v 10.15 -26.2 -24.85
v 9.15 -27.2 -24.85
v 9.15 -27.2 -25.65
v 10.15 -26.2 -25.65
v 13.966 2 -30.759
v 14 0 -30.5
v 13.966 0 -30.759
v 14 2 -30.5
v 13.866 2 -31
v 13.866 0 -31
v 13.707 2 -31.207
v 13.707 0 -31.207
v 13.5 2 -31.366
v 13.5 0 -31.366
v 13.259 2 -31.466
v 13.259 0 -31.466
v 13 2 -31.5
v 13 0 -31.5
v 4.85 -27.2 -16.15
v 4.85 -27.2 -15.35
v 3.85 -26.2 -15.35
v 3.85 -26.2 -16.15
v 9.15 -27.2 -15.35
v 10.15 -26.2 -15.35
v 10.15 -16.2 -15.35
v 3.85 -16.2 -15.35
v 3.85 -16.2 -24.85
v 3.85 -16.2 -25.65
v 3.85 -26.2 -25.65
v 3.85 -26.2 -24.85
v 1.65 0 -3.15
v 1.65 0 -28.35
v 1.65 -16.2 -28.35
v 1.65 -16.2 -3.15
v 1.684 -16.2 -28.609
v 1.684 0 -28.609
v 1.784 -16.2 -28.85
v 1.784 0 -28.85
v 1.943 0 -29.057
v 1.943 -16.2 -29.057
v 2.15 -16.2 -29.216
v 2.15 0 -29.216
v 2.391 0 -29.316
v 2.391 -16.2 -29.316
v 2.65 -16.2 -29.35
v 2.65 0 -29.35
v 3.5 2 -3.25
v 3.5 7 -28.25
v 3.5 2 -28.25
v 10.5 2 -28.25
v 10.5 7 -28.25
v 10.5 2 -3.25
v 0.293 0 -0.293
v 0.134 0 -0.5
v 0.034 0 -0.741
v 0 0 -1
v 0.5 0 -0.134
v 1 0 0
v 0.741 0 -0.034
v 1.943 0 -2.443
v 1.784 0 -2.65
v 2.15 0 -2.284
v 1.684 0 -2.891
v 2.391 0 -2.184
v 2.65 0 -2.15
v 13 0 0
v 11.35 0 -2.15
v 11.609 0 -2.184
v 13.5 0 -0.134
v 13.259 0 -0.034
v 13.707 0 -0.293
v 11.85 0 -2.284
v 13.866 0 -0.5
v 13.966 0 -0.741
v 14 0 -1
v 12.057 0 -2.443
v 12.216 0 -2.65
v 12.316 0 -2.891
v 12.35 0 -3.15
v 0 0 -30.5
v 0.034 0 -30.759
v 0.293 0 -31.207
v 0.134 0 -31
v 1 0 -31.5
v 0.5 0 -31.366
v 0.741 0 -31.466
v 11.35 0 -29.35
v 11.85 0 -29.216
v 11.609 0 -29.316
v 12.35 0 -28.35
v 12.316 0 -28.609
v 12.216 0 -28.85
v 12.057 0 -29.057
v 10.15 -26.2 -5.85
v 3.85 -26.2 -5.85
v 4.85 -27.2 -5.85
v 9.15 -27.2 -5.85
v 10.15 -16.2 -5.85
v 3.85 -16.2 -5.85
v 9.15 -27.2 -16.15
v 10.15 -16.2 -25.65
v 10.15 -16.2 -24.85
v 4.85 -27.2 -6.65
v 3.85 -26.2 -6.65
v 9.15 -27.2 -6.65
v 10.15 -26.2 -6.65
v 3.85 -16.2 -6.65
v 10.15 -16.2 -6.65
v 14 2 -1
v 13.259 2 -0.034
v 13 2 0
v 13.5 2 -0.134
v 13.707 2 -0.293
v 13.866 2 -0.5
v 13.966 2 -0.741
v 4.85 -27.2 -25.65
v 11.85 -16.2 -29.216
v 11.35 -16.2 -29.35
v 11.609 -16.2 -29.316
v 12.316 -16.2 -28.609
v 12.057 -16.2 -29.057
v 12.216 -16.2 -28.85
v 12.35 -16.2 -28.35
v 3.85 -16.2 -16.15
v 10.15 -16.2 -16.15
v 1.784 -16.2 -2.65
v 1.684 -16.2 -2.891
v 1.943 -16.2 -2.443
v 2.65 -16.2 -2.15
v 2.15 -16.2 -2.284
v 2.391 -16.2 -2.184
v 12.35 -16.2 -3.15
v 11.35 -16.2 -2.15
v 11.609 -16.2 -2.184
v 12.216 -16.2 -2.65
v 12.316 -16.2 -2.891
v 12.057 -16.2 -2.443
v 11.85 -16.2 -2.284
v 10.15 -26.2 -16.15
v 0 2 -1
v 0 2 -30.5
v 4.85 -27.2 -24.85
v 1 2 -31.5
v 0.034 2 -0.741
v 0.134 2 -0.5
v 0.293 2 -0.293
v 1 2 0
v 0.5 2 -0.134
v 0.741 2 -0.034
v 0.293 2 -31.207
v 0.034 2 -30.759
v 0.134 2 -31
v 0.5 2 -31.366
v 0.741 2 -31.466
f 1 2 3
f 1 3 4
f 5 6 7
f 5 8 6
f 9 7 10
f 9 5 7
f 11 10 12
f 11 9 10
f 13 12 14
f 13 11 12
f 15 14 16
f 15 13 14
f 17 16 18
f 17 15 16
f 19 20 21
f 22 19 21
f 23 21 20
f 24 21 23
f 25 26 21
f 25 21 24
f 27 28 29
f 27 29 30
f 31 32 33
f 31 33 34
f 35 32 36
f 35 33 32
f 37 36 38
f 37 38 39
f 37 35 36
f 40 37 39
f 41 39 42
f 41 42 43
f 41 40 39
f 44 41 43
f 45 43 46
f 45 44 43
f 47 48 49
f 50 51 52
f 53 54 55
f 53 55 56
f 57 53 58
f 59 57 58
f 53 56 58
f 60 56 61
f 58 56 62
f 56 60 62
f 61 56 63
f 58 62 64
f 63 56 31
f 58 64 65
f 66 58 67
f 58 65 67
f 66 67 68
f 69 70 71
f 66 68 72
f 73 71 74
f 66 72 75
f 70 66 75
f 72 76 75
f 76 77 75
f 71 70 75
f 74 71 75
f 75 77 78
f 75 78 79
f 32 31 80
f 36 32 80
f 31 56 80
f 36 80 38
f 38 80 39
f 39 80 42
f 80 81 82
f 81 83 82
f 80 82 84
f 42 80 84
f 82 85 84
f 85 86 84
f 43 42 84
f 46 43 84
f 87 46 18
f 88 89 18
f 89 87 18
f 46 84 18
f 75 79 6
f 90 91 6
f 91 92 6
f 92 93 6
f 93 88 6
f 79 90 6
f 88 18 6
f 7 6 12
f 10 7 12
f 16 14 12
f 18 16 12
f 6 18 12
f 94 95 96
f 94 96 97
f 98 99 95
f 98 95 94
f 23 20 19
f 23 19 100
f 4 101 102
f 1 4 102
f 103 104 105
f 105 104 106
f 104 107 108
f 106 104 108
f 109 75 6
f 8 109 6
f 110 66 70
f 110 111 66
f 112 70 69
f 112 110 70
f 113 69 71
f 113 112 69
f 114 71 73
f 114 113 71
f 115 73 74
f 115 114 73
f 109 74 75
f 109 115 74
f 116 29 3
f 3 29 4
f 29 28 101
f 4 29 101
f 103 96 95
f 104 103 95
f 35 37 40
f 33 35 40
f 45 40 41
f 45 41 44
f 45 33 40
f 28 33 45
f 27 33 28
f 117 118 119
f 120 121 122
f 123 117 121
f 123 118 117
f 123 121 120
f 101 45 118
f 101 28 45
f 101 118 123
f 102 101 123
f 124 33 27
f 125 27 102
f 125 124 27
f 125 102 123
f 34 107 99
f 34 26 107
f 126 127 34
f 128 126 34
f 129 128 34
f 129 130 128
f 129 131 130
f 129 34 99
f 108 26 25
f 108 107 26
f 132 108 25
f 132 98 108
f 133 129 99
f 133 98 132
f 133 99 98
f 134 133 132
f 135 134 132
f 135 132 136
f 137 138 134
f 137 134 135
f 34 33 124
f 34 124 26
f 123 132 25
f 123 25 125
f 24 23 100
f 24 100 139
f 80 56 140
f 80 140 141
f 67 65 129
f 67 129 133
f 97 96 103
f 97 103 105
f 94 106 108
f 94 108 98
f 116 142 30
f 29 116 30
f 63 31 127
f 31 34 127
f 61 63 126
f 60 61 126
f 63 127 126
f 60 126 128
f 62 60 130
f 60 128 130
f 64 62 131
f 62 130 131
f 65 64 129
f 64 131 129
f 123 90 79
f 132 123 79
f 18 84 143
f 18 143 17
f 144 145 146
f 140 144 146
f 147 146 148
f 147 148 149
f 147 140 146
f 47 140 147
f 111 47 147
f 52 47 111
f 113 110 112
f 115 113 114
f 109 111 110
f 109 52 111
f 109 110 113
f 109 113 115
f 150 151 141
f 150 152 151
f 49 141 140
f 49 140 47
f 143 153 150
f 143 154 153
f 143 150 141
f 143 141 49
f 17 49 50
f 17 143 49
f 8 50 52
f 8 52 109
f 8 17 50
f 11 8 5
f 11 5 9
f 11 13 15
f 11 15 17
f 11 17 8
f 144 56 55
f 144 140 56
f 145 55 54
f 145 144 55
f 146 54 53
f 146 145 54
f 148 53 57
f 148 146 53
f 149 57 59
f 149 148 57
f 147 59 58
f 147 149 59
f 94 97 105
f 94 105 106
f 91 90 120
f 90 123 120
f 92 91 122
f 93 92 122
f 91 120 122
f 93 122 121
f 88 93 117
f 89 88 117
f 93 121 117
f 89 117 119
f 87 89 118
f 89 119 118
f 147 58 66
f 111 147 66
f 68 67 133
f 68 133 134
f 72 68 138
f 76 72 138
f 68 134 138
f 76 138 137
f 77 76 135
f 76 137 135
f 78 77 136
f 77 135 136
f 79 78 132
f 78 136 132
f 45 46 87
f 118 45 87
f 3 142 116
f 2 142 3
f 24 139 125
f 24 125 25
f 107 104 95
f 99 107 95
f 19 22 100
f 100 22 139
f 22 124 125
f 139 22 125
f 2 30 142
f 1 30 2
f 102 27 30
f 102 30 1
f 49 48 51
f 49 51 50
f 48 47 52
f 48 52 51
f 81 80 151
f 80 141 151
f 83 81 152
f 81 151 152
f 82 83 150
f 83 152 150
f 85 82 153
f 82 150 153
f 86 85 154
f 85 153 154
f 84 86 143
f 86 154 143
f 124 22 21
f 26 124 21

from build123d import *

# Parameters (mm, degrees)
SKIZZE1_W                            = 14
SKIZZE1_H                            = 31.5
AUFSATZ_LINEAR_AUSTRAGEN1_DEPTH      = 2
VERRUNDUNG1_R                        = 1
SKIZZE2_W                            = 10.7
SKIZZE2_H                            = 27.2
AUFSATZ_LINEAR_AUSTRAGEN2_DEPTH      = 16.2
VERRUNDUNG2_R                        = 1
SKIZZE3_W                            = 6.3
SKIZZE3_H                            = 0.8
AUFSATZ_LINEAR_AUSTRAGEN3_DEPTH      = 11
LINEARES_MUSTER1_COUNT               = 2
LINEARES_MUSTER1_PITCH               = 9.5
LINEARES_MUSTER1_COL_COUNT           = 2
LINEARES_MUSTER1_COL_PITCH           = 9.5
SCHNITT_LINEAR_AUSTRAGEN1_DEPTH      = 40.921955112
AUFSATZ_LINEAR_AUSTRAGEN4_DEPTH      = 3.5
AUFSATZ_LINEAR_AUSTRAGEN4_DEPTH_BACK = 3.5


with BuildPart() as part:
    # Skizze1 → Aufsatz-Linear austragen1 (new body)
    with BuildSketch(Plane(origin=(0, 0, 0), x_dir=(1, 0, 0), z_dir=(0, 1, 0))):
        with Locations((7, 15.75)):
            Rectangle(SKIZZE1_W, SKIZZE1_H)
    extrude(amount=AUFSATZ_LINEAR_AUSTRAGEN1_DEPTH)

    # Verrundung1
    verrundung1_edges = [part.edges().sort_by_distance(p)[0] for p in [
        (0, 1, -31.5),
        (14, 1, -31.5),
        (14, 1, 0),
        (0, 1, 0),
    ]]
    fillet(verrundung1_edges, radius=VERRUNDUNG1_R)

    # Skizze2 → Aufsatz-Linear austragen2 (add)
    with BuildSketch(Plane.XZ):
        with Locations((7, -15.75)):
            Rectangle(SKIZZE2_W, SKIZZE2_H)
    extrude(amount=AUFSATZ_LINEAR_AUSTRAGEN2_DEPTH)

    # Verrundung2
    verrundung2_edges = [part.edges().sort_by_distance(p)[0] for p in [
        (12.35, -8.1, -29.35),
        (12.35, -8.1, -2.15),
        (1.65, -8.1, -2.15),
        (1.65, -8.1, -29.35),
    ]]
    fillet(verrundung2_edges, radius=VERRUNDUNG2_R)

    # Skizze3 → Aufsatz-Linear austragen3 (add)
    with BuildSketch(Plane.XZ.offset(16.2)):
        with Locations((7, -15.75)):
            Rectangle(SKIZZE3_W, SKIZZE3_H)
    aufsatz_linear_austragen3 = extrude(amount=AUFSATZ_LINEAR_AUSTRAGEN3_DEPTH)

    # Lineares Muster1: Aufsatz-Linear austragen3 ×2
    with Locations(*[(0, 0, -i * LINEARES_MUSTER1_PITCH) for i in range(1, LINEARES_MUSTER1_COUNT)]):
        add(aufsatz_linear_austragen3)

    # Lineares Muster1 col: Aufsatz-Linear austragen3 ×2
    with Locations(*[(0, 0, i * LINEARES_MUSTER1_COL_PITCH) for i in range(1, LINEARES_MUSTER1_COL_COUNT)]):
        add(aufsatz_linear_austragen3)

    # Skizze4 → Schnitt-Linear austragen1 (cut, through all)
    with BuildSketch(Plane.XY.offset(-5.85)):
        Polygon((3.85, -26.2), (3.85, -27.2), (4.85, -27.2), align=None)
        Polygon((9.15, -27.2), (10.15, -26.2), (10.15, -27.2), align=None)
    extrude(amount=-SCHNITT_LINEAR_AUSTRAGEN1_DEPTH, mode=Mode.SUBTRACT)

    # Skizze5 → Aufsatz-Linear austragen4 (add, two sides: drawn at the far end of the back side and taken through both)
    with BuildSketch(Plane(origin=(7, 0, 0), x_dir=(0, 0, -1), z_dir=(1, 0, 0)).offset(-AUFSATZ_LINEAR_AUSTRAGEN4_DEPTH_BACK)):
        Polygon((3.25, 2), (28.25, 7), (28.25, 2), align=None)
    extrude(amount=AUFSATZ_LINEAR_AUSTRAGEN4_DEPTH + AUFSATZ_LINEAR_AUSTRAGEN4_DEPTH_BACK)


solid = part.part
